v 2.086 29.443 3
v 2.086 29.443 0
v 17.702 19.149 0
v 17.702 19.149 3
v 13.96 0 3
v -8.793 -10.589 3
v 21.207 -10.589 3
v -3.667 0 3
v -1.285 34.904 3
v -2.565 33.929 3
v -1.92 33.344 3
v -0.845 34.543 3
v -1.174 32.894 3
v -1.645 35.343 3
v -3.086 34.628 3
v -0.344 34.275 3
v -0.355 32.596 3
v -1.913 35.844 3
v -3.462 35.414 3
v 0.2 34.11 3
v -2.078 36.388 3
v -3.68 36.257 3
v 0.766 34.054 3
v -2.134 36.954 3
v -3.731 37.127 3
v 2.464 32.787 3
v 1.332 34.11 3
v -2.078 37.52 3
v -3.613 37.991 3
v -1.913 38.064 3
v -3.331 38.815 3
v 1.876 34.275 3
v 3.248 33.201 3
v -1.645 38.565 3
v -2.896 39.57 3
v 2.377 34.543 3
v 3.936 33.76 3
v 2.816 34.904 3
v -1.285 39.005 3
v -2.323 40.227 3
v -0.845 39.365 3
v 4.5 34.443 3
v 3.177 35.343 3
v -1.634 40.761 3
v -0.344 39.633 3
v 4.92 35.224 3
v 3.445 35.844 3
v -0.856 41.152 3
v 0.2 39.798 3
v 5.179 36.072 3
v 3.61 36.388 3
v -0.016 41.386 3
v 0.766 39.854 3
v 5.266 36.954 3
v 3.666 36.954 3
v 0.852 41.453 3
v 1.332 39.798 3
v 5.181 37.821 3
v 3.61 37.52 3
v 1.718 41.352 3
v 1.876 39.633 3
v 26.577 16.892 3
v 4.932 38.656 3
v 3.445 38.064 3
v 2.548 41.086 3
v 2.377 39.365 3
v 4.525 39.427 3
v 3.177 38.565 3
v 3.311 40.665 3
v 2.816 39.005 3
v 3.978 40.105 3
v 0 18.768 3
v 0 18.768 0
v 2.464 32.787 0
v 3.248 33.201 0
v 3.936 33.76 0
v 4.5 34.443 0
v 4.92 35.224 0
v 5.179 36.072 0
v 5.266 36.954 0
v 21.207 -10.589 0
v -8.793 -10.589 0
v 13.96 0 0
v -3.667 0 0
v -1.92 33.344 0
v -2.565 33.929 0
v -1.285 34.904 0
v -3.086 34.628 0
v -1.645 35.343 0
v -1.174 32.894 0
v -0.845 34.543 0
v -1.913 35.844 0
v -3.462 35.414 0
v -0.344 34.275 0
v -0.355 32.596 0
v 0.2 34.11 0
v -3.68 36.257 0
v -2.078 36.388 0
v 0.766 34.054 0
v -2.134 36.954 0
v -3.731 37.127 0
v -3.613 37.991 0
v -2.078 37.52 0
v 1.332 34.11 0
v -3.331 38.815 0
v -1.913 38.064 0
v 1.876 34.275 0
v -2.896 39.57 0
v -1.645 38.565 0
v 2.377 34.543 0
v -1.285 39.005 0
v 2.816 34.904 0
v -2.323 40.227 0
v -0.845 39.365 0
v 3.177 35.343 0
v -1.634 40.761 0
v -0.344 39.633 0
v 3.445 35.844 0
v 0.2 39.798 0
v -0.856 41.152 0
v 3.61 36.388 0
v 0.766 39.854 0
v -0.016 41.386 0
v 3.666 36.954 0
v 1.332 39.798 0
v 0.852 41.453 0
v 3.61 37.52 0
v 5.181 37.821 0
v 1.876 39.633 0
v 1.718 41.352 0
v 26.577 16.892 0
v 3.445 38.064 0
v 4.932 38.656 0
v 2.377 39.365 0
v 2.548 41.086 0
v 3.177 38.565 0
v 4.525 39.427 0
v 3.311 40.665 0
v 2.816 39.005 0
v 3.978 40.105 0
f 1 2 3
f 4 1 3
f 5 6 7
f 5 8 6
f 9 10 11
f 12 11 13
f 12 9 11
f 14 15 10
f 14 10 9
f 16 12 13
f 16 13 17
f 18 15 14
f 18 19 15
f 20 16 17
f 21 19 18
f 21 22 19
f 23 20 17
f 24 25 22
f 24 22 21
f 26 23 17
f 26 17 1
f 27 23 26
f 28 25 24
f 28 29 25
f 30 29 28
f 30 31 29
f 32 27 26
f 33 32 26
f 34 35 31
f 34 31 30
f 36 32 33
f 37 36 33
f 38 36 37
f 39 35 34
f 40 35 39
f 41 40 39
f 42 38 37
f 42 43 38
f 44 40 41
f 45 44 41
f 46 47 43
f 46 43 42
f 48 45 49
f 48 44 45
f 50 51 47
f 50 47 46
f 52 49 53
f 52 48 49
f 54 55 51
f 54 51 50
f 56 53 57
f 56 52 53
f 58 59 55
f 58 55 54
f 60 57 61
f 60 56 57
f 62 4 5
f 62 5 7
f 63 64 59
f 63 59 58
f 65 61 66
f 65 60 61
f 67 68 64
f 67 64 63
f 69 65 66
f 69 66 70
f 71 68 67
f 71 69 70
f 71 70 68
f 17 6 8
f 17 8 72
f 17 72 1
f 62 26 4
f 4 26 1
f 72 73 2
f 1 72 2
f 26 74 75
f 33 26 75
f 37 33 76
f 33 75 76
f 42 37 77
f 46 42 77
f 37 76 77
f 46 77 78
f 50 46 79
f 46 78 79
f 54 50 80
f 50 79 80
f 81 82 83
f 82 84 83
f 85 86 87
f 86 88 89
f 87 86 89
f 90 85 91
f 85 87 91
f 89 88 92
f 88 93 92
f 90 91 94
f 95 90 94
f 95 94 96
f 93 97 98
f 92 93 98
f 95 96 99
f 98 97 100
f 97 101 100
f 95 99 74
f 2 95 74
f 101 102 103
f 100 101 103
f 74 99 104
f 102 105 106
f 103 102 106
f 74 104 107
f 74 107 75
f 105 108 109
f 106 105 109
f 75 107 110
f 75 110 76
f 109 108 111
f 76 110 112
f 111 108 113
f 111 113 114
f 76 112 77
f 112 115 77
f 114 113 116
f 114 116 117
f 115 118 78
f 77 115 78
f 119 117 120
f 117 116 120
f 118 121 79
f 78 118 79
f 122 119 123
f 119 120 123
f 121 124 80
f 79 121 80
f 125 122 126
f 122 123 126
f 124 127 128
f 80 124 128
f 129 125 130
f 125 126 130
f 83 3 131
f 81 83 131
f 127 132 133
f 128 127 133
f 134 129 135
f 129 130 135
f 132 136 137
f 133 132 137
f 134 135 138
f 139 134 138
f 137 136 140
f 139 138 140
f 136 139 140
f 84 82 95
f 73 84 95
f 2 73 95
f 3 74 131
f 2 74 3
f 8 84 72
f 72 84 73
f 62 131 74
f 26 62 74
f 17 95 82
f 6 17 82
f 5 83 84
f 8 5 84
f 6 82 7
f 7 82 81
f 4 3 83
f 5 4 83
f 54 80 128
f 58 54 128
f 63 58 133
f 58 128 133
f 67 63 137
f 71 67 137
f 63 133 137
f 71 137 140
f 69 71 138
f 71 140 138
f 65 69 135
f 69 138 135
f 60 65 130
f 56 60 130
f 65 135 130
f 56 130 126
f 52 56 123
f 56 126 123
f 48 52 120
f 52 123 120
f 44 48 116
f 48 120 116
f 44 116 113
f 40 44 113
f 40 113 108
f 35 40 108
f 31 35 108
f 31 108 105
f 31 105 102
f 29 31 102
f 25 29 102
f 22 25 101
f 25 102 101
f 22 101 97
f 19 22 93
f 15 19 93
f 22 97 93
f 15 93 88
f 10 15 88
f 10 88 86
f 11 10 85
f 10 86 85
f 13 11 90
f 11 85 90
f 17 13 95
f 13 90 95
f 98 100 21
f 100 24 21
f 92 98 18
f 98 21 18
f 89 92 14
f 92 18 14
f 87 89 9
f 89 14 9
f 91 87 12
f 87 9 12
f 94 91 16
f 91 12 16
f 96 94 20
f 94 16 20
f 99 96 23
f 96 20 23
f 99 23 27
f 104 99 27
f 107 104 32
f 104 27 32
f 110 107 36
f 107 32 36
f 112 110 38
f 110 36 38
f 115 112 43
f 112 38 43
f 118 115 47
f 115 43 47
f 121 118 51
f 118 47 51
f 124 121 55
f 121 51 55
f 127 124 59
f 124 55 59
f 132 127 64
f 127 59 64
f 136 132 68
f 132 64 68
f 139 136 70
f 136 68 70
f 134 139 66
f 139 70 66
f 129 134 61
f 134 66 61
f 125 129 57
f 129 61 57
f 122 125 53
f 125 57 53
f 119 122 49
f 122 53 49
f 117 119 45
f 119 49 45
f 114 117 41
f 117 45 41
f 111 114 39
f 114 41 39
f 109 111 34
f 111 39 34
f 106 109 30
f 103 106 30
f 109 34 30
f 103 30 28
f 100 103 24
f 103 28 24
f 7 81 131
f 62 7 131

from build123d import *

# Parameters (mm, degrees)
F1_DEPTH = 3
F2_D     = 5.8
F2_DEPTH = 3
F2_TIP   = 1.7424957952


with BuildPart() as f1:
    # F0 (on Top) → F1 (new body)
    with BuildSketch(Plane.XY):
        with BuildLine():
            ThreePointArc((2.4641827419, 32.7869937197), (1.2508461254, 32.4804226982), (0, 32.5198626147))
            Line((0, 32.5198626147), (0, 18.7683064789))
            Line((0, 18.7683064789), (2.0859143711, 29.4431521909))
            Line((2.0859143711, 29.4431521909), (17.7015492515, 19.1490593441))
            Line((17.7015492515, 19.1490593441), (13.9597342261, 0))
            Line((13.9597342261, 0), (0, 0))
            Line((0, 0), (0, -10.5885749888))
            Line((0, -10.5885749888), (21.2067912519, -10.5885749888))
            Line((21.2067912519, -10.5885749888), (26.5765645376, 16.8917003894))
            Line((26.5765645376, 16.8917003894), (2.4641827419, 32.7869937197))
        make_face()
        with BuildLine():
            Line((0, 18.7683064789), (0, 32.5198626147))
            ThreePointArc((0, 32.5198626147), (-0.178141111, 32.5543418855), (-0.3547474317, 32.5959746011))
            Line((-0.3547474317, 32.5959746011), (-8.7932087481, -10.5885749888))
            Line((-8.7932087481, -10.5885749888), (0, -10.5885749888))
            Line((0, -10.5885749888), (0, 0))
            Line((0, 0), (-3.6674141493, 0))
            Line((-3.6674141493, 0), (0, 18.7683064789))
        make_face()
        with BuildLine():
            Line((-0.3547474317, 32.5959746011), (0, 34.4114250112))
            Line((0, 34.4114250112), (2.4641827419, 32.7869937197))
            ThreePointArc((2.4641827419, 32.7869937197), (4.5003263885, 34.443479167), (5.2658624981, 36.9542120184))
            ThreePointArc((5.2658624981, 36.9542120184), (-1.9916051188, 40.510385853), (-0.3547474317, 32.5959746011))
        make_face()
        with BuildLine():
            Line((2.4641827419, 32.7869937197), (0, 34.4114250112))
            Line((0, 34.4114250112), (0, 32.5198626147))
            ThreePointArc((0, 32.5198626147), (1.2508461254, 32.4804226982), (2.4641827419, 32.7869937197))
        make_face()
        with BuildLine():
            Line((0, 32.5198626147), (0, 34.4114250112))
            Line((0, 34.4114250112), (-0.3547474317, 32.5959746011))
            ThreePointArc((-0.3547474317, 32.5959746011), (-0.178141111, 32.5543418855), (0, 32.5198626147))
        make_face()
    extrude(amount=F1_DEPTH)

    # F2
    with Locations(Plane(origin=(0, 0, 0), x_dir=(1, 0, 0), z_dir=(0, 0, -1))):
        with Locations((0.7658624981, -36.9542120184)):
            Hole(F2_D / 2, depth=F2_DEPTH)
            with Locations((0, 0, -(F2_DEPTH + F2_TIP / 2))):  # 118° drill point
                Cone(0, F2_D / 2, F2_TIP, mode=Mode.SUBTRACT)


solid = f1.part
